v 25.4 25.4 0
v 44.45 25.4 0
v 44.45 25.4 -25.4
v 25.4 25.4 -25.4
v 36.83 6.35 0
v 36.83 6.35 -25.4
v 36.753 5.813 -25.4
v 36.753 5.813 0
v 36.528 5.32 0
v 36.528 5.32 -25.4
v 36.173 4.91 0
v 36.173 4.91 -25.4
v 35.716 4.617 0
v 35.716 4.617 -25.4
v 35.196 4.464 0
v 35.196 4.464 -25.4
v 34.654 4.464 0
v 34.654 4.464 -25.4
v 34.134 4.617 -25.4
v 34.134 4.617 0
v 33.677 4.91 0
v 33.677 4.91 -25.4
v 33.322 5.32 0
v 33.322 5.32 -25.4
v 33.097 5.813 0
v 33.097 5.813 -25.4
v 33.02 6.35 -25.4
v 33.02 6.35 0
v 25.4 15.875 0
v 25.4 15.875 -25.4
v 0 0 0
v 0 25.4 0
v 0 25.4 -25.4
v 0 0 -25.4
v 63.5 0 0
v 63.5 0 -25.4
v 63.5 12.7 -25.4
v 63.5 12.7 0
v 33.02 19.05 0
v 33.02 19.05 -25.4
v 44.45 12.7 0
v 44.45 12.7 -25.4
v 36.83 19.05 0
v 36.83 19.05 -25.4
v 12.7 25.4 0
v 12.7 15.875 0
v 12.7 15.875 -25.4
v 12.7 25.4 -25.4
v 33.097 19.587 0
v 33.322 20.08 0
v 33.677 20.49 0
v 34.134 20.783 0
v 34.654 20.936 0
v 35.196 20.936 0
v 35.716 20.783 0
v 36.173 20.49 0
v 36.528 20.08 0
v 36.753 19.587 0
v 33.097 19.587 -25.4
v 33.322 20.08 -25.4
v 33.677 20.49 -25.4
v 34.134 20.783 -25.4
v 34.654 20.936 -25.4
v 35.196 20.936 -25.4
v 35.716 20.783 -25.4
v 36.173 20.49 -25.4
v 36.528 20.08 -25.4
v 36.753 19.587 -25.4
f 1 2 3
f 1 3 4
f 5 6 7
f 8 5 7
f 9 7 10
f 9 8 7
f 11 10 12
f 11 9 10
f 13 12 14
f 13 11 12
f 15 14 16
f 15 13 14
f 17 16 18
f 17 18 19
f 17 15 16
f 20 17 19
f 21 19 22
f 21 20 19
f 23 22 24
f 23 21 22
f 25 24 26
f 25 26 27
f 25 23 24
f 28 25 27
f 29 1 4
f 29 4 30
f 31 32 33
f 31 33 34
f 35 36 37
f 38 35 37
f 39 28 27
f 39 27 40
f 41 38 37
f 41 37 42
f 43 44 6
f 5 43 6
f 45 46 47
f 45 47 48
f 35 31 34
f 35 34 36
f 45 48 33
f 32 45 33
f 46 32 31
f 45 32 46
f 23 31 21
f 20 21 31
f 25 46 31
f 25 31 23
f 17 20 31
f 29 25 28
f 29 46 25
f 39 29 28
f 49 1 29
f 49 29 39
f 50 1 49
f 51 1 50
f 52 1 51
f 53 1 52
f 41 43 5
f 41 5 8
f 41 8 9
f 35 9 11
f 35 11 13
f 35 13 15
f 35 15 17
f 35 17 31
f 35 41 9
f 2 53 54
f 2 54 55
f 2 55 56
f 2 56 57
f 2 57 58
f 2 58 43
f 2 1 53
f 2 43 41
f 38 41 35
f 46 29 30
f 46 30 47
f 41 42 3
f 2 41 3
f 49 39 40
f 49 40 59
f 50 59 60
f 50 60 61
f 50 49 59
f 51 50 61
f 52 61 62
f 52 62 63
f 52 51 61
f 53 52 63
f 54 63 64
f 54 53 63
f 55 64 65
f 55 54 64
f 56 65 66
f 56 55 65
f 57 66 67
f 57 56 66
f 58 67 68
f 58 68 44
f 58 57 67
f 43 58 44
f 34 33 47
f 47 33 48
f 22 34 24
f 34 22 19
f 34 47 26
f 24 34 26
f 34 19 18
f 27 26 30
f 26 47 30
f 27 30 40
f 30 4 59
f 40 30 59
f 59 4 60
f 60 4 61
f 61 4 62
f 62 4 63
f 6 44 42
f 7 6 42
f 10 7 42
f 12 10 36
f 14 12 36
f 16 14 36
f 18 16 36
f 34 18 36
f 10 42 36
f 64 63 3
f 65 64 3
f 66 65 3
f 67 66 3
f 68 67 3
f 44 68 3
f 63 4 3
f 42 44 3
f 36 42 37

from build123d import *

# Parameters (mm, degrees)
BOSS_EXTRUDE1_DEPTH = 25.4


with BuildPart() as part:
    # Sketch1 → Boss-Extrude1 (new body)
    with BuildSketch(Plane.XY):
        Polygon((12.7, 25.4), (0, 25.4), (0, 0), (63.5, 0), (63.5, 12.7), (44.45, 12.7), (44.45, 25.4), (25.4, 25.4), (25.4, 15.875), (12.7, 15.875), align=None)
        with BuildLine():
            Line((36.83, 19.05), (36.83, 6.35))
            ThreePointArc((36.83, 6.35), (34.925, 4.445), (33.02, 6.35))
            Line((33.02, 6.35), (33.02, 19.05))
            ThreePointArc((33.02, 19.05), (34.925, 20.955), (36.83, 19.05))
        make_face(mode=Mode.SUBTRACT)
    extrude(amount=-BOSS_EXTRUDE1_DEPTH)


solid = part.part
